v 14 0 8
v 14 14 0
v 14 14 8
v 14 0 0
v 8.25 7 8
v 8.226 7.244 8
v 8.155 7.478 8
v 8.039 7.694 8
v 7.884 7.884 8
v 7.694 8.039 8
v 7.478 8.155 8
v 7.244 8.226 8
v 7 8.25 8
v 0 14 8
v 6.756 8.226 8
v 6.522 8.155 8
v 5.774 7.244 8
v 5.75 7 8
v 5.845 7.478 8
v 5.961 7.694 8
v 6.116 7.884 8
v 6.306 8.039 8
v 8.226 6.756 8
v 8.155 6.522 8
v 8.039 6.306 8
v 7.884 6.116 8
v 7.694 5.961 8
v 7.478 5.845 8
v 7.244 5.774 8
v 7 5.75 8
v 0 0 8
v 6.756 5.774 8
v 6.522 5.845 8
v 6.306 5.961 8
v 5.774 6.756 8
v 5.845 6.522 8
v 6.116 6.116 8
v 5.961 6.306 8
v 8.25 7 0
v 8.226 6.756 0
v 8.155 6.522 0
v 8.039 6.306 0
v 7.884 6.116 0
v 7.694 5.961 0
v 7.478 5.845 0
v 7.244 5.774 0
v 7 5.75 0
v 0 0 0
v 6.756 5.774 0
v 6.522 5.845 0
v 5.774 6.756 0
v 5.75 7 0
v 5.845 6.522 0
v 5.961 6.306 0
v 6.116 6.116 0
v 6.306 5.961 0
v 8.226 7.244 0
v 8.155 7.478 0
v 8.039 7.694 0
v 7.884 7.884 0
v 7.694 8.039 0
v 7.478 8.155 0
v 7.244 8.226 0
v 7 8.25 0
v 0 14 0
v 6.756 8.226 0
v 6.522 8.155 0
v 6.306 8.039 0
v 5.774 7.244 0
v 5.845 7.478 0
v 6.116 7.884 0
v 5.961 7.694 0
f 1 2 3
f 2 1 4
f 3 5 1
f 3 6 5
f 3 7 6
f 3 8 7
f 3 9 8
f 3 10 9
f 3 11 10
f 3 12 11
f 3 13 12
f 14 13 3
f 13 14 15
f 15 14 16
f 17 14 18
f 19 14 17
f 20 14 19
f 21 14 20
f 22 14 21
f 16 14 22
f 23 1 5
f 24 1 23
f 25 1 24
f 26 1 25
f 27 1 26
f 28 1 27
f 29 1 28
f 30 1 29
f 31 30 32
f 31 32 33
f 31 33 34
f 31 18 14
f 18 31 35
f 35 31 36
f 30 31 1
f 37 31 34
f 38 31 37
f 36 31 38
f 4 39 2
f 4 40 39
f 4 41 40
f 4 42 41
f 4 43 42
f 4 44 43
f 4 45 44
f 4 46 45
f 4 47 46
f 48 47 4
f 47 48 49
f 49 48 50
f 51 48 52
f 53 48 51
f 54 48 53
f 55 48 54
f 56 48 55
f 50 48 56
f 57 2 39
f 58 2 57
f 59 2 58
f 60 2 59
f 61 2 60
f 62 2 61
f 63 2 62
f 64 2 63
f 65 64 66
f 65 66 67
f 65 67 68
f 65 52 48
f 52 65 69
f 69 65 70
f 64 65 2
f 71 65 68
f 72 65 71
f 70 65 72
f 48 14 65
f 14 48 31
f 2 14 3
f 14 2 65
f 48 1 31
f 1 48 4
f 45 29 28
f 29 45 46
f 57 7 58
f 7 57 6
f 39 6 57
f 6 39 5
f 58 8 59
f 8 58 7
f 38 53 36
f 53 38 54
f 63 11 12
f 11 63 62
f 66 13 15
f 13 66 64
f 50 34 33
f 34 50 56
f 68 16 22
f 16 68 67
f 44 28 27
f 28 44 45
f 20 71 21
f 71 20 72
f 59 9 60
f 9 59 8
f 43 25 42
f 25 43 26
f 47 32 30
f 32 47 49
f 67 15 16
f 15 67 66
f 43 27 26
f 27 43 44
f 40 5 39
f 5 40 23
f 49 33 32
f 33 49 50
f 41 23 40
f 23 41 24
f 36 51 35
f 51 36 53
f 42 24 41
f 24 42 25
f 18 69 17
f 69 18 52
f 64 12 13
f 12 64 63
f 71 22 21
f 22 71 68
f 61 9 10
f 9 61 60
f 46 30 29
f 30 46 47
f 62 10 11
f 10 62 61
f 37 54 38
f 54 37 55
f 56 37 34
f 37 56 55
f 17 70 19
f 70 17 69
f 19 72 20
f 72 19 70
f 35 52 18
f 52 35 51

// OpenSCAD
$fn = 32;

// ----------------------------------------------------------------------
// Micro pad: drilled pad, 5-20 mm class
// ----------------------------------------------------------------------

// --- parameters (mm) ---
pad_l = 14;               // pad length, X
pad_w = 14;               // pad width, Y
pad_t = 8;                // pad thickness, Z
hole_d = 2.5;             // through hole diameter

difference() {
  cube([pad_l, pad_w, pad_t]);
  translate([pad_l / 2, pad_w / 2, -1])
    cylinder(h = pad_t + 2, d = hole_d);
}
